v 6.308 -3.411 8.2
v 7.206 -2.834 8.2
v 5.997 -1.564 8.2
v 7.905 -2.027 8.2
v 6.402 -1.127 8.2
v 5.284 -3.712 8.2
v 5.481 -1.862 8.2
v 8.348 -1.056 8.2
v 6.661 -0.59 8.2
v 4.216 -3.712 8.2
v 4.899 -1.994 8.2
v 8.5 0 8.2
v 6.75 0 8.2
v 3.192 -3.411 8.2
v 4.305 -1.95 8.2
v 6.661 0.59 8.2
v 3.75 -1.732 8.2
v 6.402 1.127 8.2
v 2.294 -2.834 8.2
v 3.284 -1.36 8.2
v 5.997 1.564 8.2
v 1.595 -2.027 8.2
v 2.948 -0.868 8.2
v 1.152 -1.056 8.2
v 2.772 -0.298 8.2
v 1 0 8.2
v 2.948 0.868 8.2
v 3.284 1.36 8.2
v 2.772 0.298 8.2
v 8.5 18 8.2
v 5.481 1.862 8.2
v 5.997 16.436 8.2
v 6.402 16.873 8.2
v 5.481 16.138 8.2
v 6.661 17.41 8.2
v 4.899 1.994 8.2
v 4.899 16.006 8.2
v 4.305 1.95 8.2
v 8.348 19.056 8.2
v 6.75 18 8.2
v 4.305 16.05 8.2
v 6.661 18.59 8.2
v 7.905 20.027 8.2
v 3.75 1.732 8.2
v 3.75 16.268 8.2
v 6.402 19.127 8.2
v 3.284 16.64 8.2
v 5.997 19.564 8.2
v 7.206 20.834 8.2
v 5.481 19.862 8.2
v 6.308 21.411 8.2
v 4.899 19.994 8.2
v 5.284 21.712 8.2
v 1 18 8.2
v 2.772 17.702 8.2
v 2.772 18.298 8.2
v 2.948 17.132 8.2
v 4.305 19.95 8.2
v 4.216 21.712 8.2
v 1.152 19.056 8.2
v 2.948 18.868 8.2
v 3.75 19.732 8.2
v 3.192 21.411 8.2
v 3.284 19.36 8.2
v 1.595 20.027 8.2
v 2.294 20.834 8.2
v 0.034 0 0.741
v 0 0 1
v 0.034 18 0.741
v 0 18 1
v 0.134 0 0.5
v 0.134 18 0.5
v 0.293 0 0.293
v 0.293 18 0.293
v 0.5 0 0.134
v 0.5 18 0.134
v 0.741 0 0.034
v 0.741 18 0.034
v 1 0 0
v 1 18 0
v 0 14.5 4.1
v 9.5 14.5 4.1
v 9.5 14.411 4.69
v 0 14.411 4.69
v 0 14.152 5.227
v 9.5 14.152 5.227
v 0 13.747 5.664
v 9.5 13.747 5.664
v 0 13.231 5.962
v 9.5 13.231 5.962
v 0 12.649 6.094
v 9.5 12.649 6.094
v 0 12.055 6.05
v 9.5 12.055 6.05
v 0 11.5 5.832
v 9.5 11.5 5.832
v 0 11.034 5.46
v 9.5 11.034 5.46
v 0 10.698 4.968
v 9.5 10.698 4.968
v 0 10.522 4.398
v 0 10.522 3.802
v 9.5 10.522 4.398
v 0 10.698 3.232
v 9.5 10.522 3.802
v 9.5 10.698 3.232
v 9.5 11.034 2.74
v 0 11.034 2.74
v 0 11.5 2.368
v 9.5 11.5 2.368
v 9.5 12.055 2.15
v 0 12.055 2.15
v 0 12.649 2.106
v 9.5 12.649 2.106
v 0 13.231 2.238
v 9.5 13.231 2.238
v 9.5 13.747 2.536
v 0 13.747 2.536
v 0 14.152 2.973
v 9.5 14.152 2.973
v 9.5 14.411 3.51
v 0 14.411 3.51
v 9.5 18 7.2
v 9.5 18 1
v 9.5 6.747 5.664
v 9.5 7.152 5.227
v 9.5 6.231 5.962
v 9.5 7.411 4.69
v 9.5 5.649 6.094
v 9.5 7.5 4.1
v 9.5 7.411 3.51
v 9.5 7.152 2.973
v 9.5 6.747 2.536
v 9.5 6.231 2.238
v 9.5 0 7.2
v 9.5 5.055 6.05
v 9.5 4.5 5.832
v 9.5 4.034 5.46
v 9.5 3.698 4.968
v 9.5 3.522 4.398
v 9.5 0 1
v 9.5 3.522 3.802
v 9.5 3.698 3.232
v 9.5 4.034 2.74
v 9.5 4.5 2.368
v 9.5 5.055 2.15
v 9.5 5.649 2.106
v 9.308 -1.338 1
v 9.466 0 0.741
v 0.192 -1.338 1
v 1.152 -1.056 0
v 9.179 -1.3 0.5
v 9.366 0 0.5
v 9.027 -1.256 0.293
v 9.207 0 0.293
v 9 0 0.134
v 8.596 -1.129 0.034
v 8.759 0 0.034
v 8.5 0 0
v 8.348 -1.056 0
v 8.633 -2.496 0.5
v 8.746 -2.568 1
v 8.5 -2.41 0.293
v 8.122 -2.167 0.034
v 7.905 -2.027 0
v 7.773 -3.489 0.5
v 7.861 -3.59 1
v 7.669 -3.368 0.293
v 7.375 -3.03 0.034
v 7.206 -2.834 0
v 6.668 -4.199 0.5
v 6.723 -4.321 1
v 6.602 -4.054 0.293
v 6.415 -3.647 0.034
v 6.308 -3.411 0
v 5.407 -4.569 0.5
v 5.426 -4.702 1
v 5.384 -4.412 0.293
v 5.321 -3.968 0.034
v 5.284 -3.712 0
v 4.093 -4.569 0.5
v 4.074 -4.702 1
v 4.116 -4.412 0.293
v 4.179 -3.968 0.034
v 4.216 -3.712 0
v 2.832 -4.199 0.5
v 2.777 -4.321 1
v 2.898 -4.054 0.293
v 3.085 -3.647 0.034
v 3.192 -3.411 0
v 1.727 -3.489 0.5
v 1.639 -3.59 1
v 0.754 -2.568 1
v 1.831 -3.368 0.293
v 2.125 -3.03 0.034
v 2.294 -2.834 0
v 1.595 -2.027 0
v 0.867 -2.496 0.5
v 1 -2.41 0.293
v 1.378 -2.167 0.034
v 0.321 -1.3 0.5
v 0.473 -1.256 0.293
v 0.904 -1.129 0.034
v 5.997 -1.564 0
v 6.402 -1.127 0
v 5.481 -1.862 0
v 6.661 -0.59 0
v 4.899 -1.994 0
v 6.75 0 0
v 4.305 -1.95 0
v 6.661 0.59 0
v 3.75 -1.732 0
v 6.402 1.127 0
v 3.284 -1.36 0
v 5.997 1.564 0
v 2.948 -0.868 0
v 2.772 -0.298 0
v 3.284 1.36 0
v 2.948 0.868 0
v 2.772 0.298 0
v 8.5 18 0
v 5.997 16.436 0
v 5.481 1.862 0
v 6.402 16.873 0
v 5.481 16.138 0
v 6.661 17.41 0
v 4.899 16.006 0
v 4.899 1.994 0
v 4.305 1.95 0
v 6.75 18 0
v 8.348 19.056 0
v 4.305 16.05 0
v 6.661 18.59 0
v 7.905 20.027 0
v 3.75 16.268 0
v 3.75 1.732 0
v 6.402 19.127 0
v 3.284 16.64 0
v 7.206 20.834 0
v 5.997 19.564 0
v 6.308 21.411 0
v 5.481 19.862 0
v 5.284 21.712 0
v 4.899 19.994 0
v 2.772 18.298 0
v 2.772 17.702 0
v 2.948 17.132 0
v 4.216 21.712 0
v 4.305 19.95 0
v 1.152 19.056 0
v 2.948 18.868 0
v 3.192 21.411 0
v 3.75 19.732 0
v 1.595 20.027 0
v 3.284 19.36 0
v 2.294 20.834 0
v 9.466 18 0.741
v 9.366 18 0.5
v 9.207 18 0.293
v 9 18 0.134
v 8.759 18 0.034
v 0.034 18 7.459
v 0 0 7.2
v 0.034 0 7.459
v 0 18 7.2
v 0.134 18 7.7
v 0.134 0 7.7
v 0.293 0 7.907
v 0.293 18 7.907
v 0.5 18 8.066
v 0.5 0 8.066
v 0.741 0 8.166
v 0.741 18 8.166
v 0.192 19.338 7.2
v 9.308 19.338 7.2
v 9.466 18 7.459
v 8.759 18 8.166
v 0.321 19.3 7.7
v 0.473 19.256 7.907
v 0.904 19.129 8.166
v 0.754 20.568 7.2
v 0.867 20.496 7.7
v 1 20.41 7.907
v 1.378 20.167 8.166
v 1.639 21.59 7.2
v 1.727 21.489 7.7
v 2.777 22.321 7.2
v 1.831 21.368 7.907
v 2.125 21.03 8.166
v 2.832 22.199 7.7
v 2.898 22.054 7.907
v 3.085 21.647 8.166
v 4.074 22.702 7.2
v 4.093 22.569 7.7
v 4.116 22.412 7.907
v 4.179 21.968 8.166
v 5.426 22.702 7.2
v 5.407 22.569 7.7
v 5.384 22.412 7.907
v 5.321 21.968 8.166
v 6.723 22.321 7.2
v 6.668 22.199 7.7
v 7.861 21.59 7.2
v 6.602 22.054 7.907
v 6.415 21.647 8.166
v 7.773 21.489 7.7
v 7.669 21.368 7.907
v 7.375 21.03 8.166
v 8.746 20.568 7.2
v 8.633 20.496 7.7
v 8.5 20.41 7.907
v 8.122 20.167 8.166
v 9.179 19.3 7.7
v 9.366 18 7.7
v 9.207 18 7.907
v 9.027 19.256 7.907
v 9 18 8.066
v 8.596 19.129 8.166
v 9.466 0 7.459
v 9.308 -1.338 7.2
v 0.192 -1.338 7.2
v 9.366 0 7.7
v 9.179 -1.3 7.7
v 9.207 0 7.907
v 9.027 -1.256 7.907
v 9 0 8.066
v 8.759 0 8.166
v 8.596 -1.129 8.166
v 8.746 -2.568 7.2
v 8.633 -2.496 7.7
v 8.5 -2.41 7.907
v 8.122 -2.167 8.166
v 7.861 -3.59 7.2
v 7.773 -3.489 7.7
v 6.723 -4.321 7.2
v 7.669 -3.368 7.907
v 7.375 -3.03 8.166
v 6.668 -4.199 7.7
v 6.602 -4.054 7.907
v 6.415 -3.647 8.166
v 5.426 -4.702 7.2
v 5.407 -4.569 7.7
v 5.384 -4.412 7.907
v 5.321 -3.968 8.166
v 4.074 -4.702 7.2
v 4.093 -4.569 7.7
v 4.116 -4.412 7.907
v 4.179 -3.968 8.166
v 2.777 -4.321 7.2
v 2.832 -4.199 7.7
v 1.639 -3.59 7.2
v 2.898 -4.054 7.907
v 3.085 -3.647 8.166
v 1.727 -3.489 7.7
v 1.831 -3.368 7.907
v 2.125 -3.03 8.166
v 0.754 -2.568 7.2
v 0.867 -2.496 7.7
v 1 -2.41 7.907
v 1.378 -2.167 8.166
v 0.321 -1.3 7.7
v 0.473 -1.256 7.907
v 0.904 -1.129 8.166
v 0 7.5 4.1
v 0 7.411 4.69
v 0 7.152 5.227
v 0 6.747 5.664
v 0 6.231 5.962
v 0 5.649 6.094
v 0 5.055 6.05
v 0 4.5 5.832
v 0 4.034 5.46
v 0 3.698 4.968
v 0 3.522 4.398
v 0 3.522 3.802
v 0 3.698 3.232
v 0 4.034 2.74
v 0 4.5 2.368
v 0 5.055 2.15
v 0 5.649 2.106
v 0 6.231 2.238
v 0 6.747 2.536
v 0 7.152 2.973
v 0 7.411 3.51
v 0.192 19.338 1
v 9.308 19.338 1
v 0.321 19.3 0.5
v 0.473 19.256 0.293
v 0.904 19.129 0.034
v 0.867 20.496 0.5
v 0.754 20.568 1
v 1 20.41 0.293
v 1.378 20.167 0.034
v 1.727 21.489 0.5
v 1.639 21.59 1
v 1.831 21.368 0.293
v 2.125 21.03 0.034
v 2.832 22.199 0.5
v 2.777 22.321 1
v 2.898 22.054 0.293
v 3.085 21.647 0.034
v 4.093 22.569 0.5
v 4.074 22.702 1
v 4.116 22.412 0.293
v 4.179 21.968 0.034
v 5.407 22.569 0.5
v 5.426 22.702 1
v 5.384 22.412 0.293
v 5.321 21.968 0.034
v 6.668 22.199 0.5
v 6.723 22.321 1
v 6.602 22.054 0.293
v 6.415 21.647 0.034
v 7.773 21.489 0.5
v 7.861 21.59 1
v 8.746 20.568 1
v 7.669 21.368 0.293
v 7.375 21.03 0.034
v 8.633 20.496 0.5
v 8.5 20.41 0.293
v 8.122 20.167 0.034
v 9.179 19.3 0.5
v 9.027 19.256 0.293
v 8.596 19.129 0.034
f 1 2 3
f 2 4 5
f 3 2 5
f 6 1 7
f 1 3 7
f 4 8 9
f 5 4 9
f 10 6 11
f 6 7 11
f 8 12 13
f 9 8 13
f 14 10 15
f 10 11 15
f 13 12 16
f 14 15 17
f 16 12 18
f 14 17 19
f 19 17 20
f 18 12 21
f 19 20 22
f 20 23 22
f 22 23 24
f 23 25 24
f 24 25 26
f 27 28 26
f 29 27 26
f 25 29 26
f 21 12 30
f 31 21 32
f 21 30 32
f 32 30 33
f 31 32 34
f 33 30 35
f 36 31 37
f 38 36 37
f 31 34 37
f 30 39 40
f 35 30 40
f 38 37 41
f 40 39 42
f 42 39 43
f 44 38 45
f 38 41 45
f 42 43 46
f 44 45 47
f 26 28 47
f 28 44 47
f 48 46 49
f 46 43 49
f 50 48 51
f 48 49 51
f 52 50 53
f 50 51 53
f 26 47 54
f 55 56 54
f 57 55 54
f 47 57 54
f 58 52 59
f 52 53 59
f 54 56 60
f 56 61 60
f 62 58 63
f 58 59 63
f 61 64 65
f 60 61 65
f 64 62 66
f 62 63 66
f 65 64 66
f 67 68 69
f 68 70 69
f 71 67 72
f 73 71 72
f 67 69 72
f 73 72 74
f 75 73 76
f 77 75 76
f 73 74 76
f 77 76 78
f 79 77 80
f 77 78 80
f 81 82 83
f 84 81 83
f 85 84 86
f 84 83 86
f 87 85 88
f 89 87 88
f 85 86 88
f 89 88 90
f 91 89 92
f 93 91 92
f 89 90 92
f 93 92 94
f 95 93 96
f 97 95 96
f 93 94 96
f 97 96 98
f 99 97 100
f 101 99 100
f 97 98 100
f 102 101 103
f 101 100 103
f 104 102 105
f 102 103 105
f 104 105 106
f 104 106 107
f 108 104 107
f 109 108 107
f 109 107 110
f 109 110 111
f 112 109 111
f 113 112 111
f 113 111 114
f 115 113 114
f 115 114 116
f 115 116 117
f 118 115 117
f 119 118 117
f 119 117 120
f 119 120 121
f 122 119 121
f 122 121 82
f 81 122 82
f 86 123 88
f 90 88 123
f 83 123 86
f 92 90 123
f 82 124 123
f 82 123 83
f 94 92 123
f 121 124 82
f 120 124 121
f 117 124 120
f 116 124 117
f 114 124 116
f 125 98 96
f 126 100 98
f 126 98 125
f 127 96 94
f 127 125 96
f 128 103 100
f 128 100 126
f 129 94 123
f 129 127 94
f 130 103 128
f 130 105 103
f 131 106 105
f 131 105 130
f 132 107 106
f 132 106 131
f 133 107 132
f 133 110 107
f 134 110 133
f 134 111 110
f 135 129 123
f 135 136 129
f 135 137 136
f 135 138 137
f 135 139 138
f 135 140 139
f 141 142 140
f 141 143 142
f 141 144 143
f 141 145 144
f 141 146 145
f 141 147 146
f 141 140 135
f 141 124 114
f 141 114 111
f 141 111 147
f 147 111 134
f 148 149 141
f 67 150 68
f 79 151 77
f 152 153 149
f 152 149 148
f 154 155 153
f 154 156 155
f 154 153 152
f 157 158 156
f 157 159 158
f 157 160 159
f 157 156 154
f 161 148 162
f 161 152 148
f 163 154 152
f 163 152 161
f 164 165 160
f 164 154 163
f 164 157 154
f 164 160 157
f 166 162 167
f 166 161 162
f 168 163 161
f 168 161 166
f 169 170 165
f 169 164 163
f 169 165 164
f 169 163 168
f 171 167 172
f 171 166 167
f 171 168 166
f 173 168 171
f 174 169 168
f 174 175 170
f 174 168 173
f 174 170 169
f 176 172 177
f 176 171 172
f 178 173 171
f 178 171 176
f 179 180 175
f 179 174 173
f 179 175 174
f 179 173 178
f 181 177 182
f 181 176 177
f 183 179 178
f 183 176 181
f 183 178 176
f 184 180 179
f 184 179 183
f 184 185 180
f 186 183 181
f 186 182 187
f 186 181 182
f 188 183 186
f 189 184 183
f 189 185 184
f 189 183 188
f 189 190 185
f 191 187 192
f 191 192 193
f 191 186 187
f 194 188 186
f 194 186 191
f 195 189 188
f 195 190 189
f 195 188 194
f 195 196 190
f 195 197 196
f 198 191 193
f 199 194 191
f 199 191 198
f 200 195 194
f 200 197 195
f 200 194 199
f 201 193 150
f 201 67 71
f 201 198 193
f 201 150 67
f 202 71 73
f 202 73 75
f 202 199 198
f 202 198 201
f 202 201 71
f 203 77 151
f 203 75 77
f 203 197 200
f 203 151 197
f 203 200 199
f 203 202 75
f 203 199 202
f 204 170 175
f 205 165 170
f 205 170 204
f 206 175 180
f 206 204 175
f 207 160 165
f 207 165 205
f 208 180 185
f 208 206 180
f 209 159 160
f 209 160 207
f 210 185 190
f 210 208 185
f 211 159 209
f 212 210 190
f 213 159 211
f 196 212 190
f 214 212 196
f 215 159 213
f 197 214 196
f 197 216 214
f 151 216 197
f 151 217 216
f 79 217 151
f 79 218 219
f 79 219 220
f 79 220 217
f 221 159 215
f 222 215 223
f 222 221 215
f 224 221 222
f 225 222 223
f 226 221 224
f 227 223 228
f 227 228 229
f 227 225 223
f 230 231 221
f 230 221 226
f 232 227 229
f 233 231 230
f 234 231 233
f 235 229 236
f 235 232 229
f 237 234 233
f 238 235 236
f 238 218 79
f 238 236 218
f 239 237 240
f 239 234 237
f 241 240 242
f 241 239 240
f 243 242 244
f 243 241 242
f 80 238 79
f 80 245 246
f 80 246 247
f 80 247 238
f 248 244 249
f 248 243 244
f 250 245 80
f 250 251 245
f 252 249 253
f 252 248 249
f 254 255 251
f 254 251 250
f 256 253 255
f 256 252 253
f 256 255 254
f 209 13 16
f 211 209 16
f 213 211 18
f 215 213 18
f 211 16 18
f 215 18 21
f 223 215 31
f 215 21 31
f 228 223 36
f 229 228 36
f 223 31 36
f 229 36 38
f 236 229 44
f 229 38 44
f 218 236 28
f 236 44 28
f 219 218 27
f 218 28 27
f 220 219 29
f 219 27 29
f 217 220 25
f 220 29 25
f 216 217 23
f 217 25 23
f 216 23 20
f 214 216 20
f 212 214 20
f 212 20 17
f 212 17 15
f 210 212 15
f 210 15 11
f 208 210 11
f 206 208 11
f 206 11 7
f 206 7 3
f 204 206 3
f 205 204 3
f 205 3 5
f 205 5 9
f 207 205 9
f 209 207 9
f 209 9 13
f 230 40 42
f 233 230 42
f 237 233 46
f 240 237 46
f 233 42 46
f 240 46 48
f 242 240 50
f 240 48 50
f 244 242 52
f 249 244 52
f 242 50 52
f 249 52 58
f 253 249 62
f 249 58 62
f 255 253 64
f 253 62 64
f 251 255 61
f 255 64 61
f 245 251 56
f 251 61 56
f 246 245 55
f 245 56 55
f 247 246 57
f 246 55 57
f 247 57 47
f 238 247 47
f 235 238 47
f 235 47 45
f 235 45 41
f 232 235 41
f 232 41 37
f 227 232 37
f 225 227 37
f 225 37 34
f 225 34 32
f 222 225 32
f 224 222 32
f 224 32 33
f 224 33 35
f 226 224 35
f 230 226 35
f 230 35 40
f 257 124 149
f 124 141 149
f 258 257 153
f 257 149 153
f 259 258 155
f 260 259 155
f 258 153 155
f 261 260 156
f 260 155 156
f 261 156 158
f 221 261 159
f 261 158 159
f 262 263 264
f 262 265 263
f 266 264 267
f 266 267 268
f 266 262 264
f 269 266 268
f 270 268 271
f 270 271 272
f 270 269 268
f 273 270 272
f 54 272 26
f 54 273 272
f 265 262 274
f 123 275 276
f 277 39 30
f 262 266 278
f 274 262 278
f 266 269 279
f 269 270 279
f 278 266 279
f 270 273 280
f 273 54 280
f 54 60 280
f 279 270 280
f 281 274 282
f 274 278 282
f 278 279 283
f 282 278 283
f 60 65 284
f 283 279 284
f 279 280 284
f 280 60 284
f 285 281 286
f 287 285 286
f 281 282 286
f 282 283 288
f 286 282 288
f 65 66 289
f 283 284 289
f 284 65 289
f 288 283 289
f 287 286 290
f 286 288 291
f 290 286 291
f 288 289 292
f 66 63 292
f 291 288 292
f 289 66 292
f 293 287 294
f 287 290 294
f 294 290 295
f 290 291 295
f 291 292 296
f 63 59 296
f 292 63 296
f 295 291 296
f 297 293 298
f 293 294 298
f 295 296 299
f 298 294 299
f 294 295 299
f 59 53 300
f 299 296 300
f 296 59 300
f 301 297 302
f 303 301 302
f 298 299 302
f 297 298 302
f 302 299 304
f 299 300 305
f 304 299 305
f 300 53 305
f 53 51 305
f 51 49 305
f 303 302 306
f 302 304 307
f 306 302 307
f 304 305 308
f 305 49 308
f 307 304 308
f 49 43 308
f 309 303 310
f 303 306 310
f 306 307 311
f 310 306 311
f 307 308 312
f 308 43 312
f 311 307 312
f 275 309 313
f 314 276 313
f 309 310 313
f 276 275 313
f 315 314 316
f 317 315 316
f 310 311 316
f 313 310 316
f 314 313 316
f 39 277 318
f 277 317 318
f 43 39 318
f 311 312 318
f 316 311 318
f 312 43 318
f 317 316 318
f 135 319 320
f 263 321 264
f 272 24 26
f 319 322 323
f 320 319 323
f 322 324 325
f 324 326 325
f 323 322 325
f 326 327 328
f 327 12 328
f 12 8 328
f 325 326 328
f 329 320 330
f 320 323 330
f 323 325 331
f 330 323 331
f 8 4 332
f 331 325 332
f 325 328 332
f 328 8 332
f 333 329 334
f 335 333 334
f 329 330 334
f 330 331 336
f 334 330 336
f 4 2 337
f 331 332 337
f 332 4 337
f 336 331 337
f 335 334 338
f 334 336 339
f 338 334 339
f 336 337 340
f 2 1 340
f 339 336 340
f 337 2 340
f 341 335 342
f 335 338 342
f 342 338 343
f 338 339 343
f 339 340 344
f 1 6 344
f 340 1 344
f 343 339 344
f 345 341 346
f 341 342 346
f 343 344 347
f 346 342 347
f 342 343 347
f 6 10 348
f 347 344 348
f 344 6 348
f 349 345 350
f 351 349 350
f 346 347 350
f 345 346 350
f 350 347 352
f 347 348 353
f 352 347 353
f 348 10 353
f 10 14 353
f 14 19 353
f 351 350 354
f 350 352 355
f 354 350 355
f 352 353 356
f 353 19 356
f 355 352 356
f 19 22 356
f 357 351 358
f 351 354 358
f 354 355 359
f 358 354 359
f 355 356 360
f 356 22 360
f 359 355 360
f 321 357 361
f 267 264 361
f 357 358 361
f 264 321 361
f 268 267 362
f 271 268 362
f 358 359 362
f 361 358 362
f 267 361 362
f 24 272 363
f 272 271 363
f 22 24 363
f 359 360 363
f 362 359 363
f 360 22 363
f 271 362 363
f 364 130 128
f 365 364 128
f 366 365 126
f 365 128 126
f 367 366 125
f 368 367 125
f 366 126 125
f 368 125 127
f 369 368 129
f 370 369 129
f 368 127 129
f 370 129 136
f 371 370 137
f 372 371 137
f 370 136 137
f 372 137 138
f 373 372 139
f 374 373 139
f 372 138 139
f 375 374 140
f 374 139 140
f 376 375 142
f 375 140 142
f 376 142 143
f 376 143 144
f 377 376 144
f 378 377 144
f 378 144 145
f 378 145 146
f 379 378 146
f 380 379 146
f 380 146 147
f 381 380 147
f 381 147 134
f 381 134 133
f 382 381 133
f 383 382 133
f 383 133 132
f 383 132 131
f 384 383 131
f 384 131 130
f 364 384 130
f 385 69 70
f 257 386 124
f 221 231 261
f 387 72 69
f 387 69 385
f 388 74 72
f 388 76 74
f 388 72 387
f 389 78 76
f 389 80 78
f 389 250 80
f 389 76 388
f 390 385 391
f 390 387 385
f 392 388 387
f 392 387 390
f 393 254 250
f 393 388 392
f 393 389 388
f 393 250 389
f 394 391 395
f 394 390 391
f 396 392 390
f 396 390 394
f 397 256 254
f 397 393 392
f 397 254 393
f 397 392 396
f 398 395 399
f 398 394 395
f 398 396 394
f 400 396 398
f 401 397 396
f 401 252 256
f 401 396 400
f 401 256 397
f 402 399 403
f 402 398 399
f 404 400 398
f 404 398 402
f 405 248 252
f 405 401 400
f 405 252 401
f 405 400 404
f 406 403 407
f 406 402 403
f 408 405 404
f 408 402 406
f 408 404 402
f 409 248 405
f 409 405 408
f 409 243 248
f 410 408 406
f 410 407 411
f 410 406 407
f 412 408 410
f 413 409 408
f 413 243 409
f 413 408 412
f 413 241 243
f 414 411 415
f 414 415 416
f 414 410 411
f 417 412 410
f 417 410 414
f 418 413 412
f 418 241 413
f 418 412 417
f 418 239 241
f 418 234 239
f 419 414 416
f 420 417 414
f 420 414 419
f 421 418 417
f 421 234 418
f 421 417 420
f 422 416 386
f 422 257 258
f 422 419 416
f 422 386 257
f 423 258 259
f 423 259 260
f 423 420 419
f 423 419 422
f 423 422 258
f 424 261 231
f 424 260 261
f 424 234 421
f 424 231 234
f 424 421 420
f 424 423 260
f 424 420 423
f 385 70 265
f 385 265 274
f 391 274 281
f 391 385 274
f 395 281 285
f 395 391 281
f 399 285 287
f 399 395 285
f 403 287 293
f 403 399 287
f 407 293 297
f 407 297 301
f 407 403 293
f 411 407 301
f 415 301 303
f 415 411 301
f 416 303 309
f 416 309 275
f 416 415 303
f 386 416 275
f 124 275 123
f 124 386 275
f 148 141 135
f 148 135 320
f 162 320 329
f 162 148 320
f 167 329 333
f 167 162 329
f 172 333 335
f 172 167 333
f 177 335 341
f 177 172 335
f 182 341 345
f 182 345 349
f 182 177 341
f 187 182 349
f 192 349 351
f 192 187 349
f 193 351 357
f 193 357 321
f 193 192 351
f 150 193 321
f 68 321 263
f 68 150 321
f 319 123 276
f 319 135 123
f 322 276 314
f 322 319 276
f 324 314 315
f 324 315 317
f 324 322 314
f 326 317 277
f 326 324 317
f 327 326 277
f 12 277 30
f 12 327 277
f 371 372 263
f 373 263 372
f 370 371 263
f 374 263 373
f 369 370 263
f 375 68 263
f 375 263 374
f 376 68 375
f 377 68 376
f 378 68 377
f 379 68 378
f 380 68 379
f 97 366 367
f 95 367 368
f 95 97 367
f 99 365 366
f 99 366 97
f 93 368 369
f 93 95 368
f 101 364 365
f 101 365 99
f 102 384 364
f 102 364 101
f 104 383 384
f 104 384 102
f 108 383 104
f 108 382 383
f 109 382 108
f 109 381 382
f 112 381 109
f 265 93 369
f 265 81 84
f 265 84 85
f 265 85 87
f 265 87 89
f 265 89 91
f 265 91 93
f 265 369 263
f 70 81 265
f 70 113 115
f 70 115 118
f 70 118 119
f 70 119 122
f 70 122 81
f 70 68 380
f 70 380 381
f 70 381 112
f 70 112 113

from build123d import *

# Parameters (mm, degrees)
BASE_EXTRUSION_DEPTH    = 8.2
ESQUISSE2_R             = 2
ENL_V_MAT_EXTRU_1_DEPTH = 26.981772457
CONG_1_R                = 1
CONG_2_R                = 1
ESQUISSE3_R             = 2
ENL_V_MAT_EXTRU_2_DEPTH = 26.981772457


with BuildPart() as part:
    # Esquisse1 → Base-Extrusion (new body)
    with BuildSketch(Plane.XY):
        with BuildLine():
            Line((0, 0), (0, 18))
            ThreePointArc((0, 18), (4.75, 22.75), (9.5, 18))
            Line((9.5, 18), (9.5, 0))
            ThreePointArc((9.5, 0), (4.75, -4.75), (0, 0))
        make_face()
    extrude(amount=BASE_EXTRUSION_DEPTH)

    # Esquisse2 → Enlèv. mat.-Extru.1 (cut, through all)
    with BuildSketch(Plane.XY.offset(8.2)):
        with Locations((4.75, 18)):
            Circle(ESQUISSE2_R)
        with Locations((4.75, 0)):
            Circle(ESQUISSE2_R)
    extrude(amount=-ENL_V_MAT_EXTRU_1_DEPTH, mode=Mode.SUBTRACT)

    # Congé1
    cong_1_edges = [part.edges().sort_by_distance(p)[0] for p in [
        (4.75, 22.75, 8.2),
        (0, 9, 8.2),
        (4.75, -4.75, 8.2),
        (9.5, 9, 8.2),
    ]]
    fillet(cong_1_edges, radius=CONG_1_R)

    # Congé2
    cong_2_edges = [part.edges().sort_by_distance(p)[0] for p in [
        (0, 9, 0),
        (4.75, 22.75, 0),
        (9.5, 9, 0),
        (4.75, -4.75, 0),
    ]]
    fillet(cong_2_edges, radius=CONG_2_R)

    # Esquisse3 → Enlèv. mat.-Extru.2 (cut, through all)
    with BuildSketch(Plane(origin=(9.5, 0, 0), x_dir=(0, 0, -1), z_dir=(1, 0, 0))):
        with Locations(Location((-4.1, 12.5, 0), (0, 0, 90))):
            Circle(ESQUISSE3_R)
        with Locations(Location((-4.1, 5.5, 0), (0, 0, 90))):
            Circle(ESQUISSE3_R)
    extrude(amount=-ENL_V_MAT_EXTRU_2_DEPTH, mode=Mode.SUBTRACT)


solid = part.part
